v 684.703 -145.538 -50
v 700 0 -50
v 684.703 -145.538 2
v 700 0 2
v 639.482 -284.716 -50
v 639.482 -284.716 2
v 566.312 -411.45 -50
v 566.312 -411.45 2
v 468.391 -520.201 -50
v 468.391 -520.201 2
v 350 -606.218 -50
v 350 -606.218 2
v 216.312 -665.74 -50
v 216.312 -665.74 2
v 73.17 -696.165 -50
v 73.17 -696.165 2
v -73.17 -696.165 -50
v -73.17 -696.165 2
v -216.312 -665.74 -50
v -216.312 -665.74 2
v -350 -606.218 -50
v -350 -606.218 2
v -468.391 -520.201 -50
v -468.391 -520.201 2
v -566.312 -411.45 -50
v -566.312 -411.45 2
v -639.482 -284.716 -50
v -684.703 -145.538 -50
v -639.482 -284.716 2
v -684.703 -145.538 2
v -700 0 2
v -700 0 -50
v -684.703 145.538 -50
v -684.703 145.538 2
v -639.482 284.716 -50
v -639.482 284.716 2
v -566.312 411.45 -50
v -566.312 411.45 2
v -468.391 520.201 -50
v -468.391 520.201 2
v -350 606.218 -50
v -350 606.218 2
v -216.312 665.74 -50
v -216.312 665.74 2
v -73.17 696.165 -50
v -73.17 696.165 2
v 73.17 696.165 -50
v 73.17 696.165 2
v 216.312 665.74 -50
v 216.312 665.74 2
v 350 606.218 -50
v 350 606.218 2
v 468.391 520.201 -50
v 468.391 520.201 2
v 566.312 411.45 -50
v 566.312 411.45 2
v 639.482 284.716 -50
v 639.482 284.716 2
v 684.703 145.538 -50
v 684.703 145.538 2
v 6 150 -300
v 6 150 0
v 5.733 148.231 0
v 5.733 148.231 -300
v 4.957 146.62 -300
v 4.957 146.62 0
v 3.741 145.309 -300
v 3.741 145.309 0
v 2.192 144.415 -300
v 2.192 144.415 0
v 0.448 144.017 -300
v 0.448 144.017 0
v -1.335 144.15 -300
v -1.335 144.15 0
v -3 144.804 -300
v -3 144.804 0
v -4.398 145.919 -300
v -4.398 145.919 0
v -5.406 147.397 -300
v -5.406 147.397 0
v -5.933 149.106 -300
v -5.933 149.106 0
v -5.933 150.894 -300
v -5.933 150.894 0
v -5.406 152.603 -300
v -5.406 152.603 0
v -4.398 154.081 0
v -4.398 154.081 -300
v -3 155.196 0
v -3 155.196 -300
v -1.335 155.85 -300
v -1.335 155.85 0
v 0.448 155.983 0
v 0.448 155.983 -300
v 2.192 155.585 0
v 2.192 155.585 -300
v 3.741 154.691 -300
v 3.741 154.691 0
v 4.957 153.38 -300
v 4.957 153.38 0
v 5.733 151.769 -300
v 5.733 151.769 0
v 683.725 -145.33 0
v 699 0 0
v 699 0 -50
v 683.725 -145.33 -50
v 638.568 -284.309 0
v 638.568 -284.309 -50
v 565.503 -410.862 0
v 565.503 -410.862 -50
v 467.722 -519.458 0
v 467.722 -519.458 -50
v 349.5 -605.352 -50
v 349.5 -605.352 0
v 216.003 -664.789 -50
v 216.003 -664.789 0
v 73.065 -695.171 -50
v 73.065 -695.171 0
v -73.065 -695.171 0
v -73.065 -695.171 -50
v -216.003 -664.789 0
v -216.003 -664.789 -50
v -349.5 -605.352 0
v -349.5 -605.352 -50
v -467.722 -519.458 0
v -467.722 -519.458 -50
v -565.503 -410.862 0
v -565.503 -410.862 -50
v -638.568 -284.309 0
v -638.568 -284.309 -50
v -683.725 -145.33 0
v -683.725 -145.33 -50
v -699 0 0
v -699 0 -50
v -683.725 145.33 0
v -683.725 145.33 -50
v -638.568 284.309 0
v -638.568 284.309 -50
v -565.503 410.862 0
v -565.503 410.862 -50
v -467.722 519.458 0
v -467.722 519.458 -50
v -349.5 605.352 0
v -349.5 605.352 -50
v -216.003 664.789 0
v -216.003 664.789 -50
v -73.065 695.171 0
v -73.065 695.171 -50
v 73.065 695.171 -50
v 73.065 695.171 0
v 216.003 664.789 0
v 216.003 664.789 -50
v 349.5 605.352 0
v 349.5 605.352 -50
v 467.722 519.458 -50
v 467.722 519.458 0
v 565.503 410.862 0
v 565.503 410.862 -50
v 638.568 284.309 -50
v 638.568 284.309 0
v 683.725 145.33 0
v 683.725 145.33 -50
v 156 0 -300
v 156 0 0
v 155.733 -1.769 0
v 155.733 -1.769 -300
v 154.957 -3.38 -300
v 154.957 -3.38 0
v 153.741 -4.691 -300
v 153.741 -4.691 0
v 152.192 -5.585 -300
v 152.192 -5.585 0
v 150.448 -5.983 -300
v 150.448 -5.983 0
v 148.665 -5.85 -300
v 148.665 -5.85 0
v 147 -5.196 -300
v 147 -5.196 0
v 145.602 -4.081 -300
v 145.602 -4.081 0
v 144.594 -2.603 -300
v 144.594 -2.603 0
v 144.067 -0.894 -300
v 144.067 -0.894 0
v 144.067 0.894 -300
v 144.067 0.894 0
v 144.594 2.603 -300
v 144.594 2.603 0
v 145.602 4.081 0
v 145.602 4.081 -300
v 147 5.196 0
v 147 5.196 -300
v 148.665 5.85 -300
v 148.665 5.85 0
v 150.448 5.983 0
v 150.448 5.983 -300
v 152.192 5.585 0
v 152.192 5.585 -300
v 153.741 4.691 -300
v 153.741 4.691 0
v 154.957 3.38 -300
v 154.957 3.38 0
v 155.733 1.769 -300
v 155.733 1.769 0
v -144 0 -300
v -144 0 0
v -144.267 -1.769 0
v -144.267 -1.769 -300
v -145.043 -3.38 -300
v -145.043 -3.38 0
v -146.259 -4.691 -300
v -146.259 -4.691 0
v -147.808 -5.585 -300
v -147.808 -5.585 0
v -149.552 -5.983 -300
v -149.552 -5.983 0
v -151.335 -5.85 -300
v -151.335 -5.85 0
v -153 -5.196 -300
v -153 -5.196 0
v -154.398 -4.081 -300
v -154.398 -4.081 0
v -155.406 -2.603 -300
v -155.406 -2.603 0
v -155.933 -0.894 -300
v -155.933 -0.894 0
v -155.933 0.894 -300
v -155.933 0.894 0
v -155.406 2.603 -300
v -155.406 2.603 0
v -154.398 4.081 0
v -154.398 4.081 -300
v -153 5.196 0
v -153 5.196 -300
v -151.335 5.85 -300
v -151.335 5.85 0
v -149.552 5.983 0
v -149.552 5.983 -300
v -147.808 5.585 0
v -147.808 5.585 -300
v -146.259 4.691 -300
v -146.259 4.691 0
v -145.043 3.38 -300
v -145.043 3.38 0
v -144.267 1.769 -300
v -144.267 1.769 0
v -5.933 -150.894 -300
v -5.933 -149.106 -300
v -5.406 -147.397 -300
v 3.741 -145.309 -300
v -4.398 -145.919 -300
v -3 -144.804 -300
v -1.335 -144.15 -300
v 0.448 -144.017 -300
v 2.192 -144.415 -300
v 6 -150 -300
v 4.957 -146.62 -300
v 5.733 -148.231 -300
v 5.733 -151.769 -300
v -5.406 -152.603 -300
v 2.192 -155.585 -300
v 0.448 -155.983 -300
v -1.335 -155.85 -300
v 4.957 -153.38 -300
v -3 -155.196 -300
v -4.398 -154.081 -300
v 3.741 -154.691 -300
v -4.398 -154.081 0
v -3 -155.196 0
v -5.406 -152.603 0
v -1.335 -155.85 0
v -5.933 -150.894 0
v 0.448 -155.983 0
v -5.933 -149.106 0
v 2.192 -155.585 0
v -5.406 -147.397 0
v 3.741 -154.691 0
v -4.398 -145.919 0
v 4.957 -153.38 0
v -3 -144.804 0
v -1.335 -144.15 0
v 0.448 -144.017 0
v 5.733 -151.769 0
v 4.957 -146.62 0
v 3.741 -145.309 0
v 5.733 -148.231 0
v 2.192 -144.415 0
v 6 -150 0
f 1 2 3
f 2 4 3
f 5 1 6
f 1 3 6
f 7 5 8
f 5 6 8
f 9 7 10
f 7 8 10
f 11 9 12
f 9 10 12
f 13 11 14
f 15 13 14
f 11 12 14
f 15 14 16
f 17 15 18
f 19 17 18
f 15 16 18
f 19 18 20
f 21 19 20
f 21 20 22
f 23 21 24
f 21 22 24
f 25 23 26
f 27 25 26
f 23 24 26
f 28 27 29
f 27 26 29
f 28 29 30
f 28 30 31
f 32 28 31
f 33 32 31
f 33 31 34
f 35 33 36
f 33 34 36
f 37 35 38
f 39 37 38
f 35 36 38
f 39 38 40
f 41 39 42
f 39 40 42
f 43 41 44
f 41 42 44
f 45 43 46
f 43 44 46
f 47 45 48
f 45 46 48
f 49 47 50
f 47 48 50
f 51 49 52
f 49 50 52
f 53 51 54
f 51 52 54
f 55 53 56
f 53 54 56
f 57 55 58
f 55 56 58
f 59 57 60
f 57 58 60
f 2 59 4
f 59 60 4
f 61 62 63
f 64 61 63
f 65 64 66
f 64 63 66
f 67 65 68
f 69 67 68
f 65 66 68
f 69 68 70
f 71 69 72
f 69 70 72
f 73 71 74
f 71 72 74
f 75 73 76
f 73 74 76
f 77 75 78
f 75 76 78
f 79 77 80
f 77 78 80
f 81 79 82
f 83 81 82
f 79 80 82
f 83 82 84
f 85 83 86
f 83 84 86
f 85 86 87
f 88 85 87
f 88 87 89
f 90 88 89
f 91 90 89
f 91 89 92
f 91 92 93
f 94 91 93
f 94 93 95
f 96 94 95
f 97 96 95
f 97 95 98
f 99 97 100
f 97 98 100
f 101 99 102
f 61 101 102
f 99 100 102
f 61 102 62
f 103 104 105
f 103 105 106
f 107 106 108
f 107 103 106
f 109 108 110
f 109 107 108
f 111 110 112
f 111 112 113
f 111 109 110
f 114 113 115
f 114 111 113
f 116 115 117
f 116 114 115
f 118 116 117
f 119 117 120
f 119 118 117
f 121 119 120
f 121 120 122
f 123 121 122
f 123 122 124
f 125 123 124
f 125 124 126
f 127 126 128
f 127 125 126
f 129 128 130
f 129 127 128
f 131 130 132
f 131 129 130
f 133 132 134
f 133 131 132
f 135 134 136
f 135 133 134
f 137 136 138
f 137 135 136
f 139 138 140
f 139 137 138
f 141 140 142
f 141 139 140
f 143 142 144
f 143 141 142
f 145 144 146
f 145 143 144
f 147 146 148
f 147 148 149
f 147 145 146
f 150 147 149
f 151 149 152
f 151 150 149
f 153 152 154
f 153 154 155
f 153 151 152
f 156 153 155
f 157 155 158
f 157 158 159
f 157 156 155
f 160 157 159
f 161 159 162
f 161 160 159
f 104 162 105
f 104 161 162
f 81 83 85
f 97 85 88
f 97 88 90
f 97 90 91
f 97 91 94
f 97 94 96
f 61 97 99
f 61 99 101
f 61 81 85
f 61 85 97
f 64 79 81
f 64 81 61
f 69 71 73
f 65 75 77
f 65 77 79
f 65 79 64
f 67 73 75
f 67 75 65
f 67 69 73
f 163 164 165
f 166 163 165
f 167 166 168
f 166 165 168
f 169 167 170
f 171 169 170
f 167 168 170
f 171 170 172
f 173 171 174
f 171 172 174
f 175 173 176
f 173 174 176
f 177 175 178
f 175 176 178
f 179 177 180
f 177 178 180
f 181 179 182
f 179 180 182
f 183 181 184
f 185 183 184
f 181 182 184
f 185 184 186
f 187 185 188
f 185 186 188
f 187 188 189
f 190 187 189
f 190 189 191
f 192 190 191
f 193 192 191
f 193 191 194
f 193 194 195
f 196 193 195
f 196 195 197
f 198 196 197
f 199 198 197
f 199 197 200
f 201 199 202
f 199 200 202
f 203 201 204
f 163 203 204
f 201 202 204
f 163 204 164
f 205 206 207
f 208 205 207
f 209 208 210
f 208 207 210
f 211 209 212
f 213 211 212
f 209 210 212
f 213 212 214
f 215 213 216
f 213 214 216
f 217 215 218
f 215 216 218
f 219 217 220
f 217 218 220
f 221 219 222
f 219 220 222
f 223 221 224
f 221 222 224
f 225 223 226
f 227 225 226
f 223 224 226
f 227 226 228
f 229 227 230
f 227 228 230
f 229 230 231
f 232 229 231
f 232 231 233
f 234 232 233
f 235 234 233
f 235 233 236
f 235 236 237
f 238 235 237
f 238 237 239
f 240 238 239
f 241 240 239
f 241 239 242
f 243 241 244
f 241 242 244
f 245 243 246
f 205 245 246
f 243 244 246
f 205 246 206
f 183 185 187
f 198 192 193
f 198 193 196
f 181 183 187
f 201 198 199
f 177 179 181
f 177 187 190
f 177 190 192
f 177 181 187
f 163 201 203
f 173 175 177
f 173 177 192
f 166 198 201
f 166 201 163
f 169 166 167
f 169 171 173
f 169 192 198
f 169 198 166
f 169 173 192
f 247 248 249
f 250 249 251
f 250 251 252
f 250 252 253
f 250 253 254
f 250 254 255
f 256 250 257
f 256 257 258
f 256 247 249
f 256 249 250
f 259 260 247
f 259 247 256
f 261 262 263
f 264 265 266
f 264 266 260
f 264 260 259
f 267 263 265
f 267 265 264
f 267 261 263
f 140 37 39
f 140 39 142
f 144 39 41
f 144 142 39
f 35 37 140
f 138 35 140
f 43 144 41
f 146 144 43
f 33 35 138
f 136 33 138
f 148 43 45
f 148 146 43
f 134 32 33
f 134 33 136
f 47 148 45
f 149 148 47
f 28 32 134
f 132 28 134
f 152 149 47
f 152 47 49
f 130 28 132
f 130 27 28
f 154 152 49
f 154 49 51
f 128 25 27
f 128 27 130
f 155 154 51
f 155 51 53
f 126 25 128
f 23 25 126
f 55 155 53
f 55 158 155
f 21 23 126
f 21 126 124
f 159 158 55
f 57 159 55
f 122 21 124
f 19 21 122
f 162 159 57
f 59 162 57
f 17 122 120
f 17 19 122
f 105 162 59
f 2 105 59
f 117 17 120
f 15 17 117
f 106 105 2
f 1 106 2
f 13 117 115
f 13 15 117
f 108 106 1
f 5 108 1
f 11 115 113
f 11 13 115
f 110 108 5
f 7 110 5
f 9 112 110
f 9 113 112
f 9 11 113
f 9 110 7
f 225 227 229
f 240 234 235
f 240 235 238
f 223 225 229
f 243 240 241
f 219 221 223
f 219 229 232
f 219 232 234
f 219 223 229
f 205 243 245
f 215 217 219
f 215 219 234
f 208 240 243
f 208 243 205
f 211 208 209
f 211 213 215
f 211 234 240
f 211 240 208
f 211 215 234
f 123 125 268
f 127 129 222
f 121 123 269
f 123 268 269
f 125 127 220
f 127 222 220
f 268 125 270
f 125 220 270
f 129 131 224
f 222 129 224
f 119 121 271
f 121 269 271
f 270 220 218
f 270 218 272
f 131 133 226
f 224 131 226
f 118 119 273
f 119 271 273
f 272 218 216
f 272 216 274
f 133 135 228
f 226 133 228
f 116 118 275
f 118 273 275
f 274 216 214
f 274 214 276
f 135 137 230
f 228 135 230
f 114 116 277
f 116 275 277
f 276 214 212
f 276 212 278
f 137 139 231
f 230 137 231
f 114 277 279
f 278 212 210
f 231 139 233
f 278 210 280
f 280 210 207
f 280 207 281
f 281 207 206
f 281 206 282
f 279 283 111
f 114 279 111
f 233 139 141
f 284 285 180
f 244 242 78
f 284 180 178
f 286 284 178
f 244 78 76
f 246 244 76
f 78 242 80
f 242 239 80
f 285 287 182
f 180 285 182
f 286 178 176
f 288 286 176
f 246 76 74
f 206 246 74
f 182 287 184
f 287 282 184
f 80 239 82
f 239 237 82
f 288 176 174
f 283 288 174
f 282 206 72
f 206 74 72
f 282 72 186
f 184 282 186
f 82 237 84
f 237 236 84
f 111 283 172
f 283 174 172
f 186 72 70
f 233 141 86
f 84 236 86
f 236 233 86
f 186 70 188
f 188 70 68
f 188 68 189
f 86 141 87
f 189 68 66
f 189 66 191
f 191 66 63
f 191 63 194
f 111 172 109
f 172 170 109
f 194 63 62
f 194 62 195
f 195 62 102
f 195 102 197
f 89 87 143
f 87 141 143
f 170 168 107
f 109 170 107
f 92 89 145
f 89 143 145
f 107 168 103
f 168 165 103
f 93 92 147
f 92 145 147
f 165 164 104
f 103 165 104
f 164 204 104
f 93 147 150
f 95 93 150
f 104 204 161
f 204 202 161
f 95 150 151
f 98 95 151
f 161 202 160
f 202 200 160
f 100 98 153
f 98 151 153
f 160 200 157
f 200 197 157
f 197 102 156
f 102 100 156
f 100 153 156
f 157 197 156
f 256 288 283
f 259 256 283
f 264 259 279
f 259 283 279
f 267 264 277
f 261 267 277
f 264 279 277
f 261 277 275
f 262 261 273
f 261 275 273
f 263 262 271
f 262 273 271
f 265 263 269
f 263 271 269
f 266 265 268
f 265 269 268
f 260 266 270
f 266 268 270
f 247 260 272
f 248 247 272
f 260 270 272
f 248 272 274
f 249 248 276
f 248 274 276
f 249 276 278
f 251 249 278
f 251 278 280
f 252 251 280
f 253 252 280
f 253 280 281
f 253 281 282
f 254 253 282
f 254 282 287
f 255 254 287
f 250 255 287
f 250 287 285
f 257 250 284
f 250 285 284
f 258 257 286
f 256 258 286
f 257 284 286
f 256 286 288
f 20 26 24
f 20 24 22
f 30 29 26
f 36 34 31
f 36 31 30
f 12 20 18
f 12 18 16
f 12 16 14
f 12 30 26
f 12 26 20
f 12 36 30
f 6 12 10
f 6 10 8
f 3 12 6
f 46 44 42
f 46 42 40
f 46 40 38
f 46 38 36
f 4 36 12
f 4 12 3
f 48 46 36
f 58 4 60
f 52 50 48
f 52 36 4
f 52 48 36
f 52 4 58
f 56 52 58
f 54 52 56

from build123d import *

# Parameters (mm, degrees)
F0_R     = 700
F1_DEPTH = 2
F2_R     = 700
F2_R_2   = 699
F3_DEPTH = 50
F4_R     = 6
F5_DEPTH = 300


with BuildPart() as f1:
    # F0 (on Top) → F1 (new body)
    with BuildSketch(Plane.XY):
        Circle(F0_R)
    extrude(amount=F1_DEPTH)

    # F2 (on face) → F3 (join)
    with BuildSketch(Plane(origin=(0, 0, 0), x_dir=(1, 0, 0), z_dir=(0, 0, -1))):
        Circle(F2_R)
        Circle(F2_R_2, mode=Mode.SUBTRACT)
    extrude(amount=F3_DEPTH)

    # F4 (on face) → F5 (join)
    with BuildSketch(Plane(origin=(0, 0, 0), x_dir=(1, 0, 0), z_dir=(0, 0, -1))):
        with Locations((-150, 0)):
            Circle(F4_R)
        with Locations((0, 150)):
            Circle(F4_R)
        with Locations((150, 0)):
            Circle(F4_R)
        with Locations((0, -150)):
            Circle(F4_R)
    extrude(amount=F5_DEPTH)


solid = f1.part
